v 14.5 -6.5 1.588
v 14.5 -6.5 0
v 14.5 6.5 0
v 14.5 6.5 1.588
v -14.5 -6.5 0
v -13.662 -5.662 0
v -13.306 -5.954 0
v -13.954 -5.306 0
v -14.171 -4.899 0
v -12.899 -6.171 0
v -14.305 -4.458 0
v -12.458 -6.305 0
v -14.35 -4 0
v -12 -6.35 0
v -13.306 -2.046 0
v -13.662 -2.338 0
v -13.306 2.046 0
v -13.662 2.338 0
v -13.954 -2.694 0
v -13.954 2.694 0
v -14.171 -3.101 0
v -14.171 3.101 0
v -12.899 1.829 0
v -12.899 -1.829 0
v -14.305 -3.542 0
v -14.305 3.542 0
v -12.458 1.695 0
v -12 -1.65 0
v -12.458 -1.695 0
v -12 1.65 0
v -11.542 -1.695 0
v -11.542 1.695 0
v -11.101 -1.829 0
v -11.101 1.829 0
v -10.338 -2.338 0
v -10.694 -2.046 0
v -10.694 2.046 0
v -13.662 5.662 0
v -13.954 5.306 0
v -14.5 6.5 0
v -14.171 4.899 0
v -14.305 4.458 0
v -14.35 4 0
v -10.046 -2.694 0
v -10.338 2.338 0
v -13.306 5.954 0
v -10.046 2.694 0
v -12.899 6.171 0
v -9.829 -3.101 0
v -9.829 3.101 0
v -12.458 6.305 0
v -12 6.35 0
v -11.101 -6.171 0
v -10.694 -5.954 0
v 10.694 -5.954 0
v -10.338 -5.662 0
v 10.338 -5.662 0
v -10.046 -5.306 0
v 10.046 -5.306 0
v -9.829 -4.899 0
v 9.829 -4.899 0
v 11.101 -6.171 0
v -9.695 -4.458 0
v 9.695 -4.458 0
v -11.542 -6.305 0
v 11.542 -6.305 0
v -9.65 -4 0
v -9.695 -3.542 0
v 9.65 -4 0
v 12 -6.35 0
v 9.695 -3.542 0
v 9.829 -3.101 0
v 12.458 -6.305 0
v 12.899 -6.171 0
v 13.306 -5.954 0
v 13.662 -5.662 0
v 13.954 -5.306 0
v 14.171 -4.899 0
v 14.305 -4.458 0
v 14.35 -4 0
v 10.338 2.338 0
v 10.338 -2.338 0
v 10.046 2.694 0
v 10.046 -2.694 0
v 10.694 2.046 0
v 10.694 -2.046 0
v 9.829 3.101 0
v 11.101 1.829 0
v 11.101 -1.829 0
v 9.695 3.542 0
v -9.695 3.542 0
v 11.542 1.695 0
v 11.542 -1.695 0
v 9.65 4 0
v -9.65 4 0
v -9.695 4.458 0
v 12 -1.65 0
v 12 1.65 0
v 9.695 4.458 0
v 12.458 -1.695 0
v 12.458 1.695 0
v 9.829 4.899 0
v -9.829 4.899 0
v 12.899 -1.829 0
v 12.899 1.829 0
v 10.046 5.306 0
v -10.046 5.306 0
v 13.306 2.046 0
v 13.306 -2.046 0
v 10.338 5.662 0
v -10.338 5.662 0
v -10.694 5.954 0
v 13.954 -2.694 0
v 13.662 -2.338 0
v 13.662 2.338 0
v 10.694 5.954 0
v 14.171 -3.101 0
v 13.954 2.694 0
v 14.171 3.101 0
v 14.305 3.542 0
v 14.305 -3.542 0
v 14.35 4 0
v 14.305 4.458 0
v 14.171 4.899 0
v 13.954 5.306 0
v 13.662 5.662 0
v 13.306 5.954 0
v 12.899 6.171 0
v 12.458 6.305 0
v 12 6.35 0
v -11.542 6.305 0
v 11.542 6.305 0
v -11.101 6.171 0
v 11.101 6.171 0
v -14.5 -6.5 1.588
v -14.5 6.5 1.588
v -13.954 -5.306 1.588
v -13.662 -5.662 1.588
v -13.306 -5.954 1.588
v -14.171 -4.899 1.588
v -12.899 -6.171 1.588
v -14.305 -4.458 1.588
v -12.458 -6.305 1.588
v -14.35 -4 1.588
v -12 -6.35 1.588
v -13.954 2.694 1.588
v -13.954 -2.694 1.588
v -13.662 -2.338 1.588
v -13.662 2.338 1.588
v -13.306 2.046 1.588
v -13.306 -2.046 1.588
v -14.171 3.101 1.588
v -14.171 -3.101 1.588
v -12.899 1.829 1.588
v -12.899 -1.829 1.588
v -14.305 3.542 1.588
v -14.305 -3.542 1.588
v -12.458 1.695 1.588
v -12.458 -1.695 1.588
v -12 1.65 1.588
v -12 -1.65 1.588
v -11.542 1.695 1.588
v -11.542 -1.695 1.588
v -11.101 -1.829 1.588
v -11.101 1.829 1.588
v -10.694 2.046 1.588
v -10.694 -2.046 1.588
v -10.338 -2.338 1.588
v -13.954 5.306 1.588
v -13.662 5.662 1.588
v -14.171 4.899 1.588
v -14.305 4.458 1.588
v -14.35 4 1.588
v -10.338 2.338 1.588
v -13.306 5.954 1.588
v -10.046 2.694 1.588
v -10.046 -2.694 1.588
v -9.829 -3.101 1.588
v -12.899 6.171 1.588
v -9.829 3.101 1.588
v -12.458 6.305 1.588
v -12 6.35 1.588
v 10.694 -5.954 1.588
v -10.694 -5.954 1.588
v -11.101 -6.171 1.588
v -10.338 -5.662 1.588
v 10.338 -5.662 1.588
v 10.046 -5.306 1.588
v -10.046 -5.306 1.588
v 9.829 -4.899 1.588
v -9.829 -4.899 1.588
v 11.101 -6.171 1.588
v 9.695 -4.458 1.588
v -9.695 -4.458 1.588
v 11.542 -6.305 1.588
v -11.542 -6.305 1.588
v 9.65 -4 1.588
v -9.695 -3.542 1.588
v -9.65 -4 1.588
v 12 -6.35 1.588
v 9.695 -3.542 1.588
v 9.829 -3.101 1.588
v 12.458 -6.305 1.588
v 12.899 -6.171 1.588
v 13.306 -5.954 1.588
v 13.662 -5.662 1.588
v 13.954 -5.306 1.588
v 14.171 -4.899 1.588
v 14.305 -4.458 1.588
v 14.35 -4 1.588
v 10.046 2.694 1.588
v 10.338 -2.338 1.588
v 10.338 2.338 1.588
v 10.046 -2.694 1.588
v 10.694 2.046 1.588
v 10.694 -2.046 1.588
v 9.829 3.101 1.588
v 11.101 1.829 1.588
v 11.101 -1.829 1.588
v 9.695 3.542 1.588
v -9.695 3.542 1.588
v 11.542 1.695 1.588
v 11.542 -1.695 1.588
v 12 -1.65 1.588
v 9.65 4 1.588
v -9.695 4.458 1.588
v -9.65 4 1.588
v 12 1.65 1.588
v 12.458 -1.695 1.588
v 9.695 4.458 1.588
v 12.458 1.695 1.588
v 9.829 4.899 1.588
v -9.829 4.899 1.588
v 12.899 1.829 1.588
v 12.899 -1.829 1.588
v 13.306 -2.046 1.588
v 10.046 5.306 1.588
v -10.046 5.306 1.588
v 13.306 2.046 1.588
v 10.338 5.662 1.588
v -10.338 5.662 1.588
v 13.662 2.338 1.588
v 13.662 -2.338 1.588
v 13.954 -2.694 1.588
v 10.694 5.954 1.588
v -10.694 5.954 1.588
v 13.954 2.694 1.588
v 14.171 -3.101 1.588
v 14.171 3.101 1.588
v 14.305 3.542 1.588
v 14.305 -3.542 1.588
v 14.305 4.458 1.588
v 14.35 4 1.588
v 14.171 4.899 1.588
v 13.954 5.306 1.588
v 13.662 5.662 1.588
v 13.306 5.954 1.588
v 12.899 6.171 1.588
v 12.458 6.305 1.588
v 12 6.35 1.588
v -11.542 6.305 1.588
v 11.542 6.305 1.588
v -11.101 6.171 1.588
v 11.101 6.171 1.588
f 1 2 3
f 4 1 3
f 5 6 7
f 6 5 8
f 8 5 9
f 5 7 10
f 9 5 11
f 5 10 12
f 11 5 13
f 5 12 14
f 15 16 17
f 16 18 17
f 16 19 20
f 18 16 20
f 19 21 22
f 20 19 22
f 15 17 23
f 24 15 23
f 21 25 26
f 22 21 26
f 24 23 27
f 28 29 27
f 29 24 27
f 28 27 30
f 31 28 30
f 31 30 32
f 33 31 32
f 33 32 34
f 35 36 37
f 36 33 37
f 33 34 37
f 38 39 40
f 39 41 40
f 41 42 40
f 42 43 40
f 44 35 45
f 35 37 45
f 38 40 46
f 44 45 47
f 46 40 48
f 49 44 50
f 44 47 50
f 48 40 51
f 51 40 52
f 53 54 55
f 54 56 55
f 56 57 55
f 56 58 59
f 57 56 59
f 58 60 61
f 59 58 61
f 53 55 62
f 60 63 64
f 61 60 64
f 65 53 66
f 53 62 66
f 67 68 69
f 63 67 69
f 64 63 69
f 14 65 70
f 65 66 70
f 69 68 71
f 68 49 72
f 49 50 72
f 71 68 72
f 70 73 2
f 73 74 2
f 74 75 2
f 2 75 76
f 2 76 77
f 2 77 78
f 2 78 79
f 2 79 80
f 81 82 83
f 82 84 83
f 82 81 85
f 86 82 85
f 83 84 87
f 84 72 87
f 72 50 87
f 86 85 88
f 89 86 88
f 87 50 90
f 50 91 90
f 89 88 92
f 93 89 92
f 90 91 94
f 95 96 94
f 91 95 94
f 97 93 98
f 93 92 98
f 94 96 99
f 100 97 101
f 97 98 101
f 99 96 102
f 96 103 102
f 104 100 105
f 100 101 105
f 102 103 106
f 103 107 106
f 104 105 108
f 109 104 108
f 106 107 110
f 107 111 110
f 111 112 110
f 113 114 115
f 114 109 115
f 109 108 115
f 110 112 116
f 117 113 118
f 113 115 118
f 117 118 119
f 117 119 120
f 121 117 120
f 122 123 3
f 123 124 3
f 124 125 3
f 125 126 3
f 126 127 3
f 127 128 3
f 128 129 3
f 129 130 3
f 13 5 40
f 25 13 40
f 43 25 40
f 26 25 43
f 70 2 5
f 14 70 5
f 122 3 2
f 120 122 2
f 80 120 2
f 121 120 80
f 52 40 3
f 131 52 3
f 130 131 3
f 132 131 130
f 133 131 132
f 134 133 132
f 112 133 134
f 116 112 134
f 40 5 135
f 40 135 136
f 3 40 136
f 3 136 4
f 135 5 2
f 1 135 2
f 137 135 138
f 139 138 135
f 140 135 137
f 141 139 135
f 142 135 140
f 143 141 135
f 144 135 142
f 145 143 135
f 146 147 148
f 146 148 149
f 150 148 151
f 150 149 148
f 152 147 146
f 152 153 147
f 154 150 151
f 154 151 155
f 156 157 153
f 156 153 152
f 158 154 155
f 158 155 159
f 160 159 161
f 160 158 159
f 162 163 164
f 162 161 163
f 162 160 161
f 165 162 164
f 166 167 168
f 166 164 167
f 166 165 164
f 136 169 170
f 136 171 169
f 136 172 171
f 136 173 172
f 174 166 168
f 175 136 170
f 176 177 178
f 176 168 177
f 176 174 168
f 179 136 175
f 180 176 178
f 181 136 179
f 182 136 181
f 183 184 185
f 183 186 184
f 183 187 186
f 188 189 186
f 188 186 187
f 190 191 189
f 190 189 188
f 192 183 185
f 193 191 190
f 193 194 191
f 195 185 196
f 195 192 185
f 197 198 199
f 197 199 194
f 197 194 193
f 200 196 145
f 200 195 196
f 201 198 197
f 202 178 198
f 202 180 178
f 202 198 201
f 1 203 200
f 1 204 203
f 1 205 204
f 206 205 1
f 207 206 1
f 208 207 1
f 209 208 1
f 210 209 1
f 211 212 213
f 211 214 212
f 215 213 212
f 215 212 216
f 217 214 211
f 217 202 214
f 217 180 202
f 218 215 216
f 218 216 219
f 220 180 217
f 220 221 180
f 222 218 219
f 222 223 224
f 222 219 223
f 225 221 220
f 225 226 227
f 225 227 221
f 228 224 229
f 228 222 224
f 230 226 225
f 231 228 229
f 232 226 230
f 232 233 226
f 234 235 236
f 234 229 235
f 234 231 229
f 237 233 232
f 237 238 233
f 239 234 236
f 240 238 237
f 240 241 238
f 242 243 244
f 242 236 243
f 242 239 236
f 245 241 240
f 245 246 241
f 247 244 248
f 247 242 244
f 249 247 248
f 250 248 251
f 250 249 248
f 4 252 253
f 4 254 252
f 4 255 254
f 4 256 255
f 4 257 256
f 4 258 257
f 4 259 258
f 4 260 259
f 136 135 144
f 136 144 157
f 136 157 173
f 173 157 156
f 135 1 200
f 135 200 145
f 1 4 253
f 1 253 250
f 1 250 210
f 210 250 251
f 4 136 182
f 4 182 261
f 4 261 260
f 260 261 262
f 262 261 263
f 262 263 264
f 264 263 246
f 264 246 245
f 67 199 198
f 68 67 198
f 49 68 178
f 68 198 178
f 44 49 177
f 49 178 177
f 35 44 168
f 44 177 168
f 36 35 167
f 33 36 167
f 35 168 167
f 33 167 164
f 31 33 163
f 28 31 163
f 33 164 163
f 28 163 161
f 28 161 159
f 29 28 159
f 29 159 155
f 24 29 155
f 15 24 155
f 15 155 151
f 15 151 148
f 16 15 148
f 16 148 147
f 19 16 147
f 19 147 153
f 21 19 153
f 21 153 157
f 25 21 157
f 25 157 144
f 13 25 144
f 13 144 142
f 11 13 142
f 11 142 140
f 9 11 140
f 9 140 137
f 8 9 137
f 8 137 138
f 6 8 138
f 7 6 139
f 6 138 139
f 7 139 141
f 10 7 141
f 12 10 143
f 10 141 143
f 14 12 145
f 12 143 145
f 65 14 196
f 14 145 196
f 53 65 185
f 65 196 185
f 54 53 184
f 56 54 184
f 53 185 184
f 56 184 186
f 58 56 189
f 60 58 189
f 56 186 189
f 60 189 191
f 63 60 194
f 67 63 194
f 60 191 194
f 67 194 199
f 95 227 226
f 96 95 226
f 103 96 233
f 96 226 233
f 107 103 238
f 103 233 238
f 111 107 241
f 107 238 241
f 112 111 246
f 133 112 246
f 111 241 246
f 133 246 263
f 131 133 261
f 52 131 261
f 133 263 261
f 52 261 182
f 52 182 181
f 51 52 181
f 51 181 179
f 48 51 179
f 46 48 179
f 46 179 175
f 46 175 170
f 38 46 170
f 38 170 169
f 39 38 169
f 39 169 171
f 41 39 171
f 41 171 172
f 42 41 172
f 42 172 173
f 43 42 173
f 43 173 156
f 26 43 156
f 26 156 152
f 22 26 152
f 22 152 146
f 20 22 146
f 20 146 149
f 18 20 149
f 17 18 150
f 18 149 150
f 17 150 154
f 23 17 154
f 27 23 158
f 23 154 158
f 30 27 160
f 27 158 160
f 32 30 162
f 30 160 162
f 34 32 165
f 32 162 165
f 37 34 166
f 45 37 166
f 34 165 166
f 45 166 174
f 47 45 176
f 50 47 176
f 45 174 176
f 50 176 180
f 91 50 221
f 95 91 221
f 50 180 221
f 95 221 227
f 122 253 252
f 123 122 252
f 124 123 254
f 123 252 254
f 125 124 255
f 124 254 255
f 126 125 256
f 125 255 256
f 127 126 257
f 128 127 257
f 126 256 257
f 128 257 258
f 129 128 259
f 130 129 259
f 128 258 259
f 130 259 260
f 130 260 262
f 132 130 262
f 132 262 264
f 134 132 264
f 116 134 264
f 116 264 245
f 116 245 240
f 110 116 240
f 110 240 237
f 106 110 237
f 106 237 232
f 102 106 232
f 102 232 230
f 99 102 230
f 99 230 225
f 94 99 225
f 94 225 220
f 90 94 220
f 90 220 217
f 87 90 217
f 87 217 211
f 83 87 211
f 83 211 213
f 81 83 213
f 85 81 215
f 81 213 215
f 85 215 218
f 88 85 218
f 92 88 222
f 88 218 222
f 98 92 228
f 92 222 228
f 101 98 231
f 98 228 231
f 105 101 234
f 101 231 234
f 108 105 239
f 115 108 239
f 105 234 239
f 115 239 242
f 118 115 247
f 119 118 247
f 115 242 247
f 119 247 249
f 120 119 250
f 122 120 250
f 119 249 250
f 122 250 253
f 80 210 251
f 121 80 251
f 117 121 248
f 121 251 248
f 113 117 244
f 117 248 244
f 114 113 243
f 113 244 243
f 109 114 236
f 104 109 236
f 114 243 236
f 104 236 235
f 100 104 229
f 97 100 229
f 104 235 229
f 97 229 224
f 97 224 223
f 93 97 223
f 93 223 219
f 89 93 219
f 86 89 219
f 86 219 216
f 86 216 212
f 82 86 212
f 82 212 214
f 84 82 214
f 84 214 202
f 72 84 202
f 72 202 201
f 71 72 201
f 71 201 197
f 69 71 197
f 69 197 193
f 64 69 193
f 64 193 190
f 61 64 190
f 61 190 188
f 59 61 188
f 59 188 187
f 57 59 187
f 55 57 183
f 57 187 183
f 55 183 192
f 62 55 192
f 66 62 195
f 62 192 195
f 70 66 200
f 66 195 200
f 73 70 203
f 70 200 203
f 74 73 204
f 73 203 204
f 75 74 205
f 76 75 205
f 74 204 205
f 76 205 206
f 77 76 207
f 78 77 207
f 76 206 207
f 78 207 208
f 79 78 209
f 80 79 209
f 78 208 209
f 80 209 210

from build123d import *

# Parameters (mm, degrees)
F0_W     = 29
F0_H     = 13
F1_DEPTH = 1.5875
F2_R     = 6.25
F3_DEPTH = 2
F5_R     = 2.35
F6_DEPTH = 25.4


with BuildPart() as f1:
    # F0 (on Top) → F1 (new body)
    with BuildSketch(Plane.XY):
        Rectangle(F0_W, F0_H)
    extrude(amount=F1_DEPTH)

    # F5 (on face) → F6 (cut)
    with BuildSketch(Plane.XY.offset(1.5875)):
        with Locations((-12, 4)):
            Circle(F5_R)
        with Locations((-12, -4)):
            Circle(F5_R)
        with Locations((12, -4)):
            Circle(F5_R)
        with Locations((12, 4)):
            Circle(F5_R)
    extrude(amount=-F6_DEPTH, mode=Mode.SUBTRACT)


with BuildPart() as f3:
    # F2 (on Top) → F3 (new body)
    with BuildSketch(Plane.XY):
        with Locations((-62.359009, 0)):
            Circle(F2_R)
    extrude(amount=F3_DEPTH)


solid = f1.part
